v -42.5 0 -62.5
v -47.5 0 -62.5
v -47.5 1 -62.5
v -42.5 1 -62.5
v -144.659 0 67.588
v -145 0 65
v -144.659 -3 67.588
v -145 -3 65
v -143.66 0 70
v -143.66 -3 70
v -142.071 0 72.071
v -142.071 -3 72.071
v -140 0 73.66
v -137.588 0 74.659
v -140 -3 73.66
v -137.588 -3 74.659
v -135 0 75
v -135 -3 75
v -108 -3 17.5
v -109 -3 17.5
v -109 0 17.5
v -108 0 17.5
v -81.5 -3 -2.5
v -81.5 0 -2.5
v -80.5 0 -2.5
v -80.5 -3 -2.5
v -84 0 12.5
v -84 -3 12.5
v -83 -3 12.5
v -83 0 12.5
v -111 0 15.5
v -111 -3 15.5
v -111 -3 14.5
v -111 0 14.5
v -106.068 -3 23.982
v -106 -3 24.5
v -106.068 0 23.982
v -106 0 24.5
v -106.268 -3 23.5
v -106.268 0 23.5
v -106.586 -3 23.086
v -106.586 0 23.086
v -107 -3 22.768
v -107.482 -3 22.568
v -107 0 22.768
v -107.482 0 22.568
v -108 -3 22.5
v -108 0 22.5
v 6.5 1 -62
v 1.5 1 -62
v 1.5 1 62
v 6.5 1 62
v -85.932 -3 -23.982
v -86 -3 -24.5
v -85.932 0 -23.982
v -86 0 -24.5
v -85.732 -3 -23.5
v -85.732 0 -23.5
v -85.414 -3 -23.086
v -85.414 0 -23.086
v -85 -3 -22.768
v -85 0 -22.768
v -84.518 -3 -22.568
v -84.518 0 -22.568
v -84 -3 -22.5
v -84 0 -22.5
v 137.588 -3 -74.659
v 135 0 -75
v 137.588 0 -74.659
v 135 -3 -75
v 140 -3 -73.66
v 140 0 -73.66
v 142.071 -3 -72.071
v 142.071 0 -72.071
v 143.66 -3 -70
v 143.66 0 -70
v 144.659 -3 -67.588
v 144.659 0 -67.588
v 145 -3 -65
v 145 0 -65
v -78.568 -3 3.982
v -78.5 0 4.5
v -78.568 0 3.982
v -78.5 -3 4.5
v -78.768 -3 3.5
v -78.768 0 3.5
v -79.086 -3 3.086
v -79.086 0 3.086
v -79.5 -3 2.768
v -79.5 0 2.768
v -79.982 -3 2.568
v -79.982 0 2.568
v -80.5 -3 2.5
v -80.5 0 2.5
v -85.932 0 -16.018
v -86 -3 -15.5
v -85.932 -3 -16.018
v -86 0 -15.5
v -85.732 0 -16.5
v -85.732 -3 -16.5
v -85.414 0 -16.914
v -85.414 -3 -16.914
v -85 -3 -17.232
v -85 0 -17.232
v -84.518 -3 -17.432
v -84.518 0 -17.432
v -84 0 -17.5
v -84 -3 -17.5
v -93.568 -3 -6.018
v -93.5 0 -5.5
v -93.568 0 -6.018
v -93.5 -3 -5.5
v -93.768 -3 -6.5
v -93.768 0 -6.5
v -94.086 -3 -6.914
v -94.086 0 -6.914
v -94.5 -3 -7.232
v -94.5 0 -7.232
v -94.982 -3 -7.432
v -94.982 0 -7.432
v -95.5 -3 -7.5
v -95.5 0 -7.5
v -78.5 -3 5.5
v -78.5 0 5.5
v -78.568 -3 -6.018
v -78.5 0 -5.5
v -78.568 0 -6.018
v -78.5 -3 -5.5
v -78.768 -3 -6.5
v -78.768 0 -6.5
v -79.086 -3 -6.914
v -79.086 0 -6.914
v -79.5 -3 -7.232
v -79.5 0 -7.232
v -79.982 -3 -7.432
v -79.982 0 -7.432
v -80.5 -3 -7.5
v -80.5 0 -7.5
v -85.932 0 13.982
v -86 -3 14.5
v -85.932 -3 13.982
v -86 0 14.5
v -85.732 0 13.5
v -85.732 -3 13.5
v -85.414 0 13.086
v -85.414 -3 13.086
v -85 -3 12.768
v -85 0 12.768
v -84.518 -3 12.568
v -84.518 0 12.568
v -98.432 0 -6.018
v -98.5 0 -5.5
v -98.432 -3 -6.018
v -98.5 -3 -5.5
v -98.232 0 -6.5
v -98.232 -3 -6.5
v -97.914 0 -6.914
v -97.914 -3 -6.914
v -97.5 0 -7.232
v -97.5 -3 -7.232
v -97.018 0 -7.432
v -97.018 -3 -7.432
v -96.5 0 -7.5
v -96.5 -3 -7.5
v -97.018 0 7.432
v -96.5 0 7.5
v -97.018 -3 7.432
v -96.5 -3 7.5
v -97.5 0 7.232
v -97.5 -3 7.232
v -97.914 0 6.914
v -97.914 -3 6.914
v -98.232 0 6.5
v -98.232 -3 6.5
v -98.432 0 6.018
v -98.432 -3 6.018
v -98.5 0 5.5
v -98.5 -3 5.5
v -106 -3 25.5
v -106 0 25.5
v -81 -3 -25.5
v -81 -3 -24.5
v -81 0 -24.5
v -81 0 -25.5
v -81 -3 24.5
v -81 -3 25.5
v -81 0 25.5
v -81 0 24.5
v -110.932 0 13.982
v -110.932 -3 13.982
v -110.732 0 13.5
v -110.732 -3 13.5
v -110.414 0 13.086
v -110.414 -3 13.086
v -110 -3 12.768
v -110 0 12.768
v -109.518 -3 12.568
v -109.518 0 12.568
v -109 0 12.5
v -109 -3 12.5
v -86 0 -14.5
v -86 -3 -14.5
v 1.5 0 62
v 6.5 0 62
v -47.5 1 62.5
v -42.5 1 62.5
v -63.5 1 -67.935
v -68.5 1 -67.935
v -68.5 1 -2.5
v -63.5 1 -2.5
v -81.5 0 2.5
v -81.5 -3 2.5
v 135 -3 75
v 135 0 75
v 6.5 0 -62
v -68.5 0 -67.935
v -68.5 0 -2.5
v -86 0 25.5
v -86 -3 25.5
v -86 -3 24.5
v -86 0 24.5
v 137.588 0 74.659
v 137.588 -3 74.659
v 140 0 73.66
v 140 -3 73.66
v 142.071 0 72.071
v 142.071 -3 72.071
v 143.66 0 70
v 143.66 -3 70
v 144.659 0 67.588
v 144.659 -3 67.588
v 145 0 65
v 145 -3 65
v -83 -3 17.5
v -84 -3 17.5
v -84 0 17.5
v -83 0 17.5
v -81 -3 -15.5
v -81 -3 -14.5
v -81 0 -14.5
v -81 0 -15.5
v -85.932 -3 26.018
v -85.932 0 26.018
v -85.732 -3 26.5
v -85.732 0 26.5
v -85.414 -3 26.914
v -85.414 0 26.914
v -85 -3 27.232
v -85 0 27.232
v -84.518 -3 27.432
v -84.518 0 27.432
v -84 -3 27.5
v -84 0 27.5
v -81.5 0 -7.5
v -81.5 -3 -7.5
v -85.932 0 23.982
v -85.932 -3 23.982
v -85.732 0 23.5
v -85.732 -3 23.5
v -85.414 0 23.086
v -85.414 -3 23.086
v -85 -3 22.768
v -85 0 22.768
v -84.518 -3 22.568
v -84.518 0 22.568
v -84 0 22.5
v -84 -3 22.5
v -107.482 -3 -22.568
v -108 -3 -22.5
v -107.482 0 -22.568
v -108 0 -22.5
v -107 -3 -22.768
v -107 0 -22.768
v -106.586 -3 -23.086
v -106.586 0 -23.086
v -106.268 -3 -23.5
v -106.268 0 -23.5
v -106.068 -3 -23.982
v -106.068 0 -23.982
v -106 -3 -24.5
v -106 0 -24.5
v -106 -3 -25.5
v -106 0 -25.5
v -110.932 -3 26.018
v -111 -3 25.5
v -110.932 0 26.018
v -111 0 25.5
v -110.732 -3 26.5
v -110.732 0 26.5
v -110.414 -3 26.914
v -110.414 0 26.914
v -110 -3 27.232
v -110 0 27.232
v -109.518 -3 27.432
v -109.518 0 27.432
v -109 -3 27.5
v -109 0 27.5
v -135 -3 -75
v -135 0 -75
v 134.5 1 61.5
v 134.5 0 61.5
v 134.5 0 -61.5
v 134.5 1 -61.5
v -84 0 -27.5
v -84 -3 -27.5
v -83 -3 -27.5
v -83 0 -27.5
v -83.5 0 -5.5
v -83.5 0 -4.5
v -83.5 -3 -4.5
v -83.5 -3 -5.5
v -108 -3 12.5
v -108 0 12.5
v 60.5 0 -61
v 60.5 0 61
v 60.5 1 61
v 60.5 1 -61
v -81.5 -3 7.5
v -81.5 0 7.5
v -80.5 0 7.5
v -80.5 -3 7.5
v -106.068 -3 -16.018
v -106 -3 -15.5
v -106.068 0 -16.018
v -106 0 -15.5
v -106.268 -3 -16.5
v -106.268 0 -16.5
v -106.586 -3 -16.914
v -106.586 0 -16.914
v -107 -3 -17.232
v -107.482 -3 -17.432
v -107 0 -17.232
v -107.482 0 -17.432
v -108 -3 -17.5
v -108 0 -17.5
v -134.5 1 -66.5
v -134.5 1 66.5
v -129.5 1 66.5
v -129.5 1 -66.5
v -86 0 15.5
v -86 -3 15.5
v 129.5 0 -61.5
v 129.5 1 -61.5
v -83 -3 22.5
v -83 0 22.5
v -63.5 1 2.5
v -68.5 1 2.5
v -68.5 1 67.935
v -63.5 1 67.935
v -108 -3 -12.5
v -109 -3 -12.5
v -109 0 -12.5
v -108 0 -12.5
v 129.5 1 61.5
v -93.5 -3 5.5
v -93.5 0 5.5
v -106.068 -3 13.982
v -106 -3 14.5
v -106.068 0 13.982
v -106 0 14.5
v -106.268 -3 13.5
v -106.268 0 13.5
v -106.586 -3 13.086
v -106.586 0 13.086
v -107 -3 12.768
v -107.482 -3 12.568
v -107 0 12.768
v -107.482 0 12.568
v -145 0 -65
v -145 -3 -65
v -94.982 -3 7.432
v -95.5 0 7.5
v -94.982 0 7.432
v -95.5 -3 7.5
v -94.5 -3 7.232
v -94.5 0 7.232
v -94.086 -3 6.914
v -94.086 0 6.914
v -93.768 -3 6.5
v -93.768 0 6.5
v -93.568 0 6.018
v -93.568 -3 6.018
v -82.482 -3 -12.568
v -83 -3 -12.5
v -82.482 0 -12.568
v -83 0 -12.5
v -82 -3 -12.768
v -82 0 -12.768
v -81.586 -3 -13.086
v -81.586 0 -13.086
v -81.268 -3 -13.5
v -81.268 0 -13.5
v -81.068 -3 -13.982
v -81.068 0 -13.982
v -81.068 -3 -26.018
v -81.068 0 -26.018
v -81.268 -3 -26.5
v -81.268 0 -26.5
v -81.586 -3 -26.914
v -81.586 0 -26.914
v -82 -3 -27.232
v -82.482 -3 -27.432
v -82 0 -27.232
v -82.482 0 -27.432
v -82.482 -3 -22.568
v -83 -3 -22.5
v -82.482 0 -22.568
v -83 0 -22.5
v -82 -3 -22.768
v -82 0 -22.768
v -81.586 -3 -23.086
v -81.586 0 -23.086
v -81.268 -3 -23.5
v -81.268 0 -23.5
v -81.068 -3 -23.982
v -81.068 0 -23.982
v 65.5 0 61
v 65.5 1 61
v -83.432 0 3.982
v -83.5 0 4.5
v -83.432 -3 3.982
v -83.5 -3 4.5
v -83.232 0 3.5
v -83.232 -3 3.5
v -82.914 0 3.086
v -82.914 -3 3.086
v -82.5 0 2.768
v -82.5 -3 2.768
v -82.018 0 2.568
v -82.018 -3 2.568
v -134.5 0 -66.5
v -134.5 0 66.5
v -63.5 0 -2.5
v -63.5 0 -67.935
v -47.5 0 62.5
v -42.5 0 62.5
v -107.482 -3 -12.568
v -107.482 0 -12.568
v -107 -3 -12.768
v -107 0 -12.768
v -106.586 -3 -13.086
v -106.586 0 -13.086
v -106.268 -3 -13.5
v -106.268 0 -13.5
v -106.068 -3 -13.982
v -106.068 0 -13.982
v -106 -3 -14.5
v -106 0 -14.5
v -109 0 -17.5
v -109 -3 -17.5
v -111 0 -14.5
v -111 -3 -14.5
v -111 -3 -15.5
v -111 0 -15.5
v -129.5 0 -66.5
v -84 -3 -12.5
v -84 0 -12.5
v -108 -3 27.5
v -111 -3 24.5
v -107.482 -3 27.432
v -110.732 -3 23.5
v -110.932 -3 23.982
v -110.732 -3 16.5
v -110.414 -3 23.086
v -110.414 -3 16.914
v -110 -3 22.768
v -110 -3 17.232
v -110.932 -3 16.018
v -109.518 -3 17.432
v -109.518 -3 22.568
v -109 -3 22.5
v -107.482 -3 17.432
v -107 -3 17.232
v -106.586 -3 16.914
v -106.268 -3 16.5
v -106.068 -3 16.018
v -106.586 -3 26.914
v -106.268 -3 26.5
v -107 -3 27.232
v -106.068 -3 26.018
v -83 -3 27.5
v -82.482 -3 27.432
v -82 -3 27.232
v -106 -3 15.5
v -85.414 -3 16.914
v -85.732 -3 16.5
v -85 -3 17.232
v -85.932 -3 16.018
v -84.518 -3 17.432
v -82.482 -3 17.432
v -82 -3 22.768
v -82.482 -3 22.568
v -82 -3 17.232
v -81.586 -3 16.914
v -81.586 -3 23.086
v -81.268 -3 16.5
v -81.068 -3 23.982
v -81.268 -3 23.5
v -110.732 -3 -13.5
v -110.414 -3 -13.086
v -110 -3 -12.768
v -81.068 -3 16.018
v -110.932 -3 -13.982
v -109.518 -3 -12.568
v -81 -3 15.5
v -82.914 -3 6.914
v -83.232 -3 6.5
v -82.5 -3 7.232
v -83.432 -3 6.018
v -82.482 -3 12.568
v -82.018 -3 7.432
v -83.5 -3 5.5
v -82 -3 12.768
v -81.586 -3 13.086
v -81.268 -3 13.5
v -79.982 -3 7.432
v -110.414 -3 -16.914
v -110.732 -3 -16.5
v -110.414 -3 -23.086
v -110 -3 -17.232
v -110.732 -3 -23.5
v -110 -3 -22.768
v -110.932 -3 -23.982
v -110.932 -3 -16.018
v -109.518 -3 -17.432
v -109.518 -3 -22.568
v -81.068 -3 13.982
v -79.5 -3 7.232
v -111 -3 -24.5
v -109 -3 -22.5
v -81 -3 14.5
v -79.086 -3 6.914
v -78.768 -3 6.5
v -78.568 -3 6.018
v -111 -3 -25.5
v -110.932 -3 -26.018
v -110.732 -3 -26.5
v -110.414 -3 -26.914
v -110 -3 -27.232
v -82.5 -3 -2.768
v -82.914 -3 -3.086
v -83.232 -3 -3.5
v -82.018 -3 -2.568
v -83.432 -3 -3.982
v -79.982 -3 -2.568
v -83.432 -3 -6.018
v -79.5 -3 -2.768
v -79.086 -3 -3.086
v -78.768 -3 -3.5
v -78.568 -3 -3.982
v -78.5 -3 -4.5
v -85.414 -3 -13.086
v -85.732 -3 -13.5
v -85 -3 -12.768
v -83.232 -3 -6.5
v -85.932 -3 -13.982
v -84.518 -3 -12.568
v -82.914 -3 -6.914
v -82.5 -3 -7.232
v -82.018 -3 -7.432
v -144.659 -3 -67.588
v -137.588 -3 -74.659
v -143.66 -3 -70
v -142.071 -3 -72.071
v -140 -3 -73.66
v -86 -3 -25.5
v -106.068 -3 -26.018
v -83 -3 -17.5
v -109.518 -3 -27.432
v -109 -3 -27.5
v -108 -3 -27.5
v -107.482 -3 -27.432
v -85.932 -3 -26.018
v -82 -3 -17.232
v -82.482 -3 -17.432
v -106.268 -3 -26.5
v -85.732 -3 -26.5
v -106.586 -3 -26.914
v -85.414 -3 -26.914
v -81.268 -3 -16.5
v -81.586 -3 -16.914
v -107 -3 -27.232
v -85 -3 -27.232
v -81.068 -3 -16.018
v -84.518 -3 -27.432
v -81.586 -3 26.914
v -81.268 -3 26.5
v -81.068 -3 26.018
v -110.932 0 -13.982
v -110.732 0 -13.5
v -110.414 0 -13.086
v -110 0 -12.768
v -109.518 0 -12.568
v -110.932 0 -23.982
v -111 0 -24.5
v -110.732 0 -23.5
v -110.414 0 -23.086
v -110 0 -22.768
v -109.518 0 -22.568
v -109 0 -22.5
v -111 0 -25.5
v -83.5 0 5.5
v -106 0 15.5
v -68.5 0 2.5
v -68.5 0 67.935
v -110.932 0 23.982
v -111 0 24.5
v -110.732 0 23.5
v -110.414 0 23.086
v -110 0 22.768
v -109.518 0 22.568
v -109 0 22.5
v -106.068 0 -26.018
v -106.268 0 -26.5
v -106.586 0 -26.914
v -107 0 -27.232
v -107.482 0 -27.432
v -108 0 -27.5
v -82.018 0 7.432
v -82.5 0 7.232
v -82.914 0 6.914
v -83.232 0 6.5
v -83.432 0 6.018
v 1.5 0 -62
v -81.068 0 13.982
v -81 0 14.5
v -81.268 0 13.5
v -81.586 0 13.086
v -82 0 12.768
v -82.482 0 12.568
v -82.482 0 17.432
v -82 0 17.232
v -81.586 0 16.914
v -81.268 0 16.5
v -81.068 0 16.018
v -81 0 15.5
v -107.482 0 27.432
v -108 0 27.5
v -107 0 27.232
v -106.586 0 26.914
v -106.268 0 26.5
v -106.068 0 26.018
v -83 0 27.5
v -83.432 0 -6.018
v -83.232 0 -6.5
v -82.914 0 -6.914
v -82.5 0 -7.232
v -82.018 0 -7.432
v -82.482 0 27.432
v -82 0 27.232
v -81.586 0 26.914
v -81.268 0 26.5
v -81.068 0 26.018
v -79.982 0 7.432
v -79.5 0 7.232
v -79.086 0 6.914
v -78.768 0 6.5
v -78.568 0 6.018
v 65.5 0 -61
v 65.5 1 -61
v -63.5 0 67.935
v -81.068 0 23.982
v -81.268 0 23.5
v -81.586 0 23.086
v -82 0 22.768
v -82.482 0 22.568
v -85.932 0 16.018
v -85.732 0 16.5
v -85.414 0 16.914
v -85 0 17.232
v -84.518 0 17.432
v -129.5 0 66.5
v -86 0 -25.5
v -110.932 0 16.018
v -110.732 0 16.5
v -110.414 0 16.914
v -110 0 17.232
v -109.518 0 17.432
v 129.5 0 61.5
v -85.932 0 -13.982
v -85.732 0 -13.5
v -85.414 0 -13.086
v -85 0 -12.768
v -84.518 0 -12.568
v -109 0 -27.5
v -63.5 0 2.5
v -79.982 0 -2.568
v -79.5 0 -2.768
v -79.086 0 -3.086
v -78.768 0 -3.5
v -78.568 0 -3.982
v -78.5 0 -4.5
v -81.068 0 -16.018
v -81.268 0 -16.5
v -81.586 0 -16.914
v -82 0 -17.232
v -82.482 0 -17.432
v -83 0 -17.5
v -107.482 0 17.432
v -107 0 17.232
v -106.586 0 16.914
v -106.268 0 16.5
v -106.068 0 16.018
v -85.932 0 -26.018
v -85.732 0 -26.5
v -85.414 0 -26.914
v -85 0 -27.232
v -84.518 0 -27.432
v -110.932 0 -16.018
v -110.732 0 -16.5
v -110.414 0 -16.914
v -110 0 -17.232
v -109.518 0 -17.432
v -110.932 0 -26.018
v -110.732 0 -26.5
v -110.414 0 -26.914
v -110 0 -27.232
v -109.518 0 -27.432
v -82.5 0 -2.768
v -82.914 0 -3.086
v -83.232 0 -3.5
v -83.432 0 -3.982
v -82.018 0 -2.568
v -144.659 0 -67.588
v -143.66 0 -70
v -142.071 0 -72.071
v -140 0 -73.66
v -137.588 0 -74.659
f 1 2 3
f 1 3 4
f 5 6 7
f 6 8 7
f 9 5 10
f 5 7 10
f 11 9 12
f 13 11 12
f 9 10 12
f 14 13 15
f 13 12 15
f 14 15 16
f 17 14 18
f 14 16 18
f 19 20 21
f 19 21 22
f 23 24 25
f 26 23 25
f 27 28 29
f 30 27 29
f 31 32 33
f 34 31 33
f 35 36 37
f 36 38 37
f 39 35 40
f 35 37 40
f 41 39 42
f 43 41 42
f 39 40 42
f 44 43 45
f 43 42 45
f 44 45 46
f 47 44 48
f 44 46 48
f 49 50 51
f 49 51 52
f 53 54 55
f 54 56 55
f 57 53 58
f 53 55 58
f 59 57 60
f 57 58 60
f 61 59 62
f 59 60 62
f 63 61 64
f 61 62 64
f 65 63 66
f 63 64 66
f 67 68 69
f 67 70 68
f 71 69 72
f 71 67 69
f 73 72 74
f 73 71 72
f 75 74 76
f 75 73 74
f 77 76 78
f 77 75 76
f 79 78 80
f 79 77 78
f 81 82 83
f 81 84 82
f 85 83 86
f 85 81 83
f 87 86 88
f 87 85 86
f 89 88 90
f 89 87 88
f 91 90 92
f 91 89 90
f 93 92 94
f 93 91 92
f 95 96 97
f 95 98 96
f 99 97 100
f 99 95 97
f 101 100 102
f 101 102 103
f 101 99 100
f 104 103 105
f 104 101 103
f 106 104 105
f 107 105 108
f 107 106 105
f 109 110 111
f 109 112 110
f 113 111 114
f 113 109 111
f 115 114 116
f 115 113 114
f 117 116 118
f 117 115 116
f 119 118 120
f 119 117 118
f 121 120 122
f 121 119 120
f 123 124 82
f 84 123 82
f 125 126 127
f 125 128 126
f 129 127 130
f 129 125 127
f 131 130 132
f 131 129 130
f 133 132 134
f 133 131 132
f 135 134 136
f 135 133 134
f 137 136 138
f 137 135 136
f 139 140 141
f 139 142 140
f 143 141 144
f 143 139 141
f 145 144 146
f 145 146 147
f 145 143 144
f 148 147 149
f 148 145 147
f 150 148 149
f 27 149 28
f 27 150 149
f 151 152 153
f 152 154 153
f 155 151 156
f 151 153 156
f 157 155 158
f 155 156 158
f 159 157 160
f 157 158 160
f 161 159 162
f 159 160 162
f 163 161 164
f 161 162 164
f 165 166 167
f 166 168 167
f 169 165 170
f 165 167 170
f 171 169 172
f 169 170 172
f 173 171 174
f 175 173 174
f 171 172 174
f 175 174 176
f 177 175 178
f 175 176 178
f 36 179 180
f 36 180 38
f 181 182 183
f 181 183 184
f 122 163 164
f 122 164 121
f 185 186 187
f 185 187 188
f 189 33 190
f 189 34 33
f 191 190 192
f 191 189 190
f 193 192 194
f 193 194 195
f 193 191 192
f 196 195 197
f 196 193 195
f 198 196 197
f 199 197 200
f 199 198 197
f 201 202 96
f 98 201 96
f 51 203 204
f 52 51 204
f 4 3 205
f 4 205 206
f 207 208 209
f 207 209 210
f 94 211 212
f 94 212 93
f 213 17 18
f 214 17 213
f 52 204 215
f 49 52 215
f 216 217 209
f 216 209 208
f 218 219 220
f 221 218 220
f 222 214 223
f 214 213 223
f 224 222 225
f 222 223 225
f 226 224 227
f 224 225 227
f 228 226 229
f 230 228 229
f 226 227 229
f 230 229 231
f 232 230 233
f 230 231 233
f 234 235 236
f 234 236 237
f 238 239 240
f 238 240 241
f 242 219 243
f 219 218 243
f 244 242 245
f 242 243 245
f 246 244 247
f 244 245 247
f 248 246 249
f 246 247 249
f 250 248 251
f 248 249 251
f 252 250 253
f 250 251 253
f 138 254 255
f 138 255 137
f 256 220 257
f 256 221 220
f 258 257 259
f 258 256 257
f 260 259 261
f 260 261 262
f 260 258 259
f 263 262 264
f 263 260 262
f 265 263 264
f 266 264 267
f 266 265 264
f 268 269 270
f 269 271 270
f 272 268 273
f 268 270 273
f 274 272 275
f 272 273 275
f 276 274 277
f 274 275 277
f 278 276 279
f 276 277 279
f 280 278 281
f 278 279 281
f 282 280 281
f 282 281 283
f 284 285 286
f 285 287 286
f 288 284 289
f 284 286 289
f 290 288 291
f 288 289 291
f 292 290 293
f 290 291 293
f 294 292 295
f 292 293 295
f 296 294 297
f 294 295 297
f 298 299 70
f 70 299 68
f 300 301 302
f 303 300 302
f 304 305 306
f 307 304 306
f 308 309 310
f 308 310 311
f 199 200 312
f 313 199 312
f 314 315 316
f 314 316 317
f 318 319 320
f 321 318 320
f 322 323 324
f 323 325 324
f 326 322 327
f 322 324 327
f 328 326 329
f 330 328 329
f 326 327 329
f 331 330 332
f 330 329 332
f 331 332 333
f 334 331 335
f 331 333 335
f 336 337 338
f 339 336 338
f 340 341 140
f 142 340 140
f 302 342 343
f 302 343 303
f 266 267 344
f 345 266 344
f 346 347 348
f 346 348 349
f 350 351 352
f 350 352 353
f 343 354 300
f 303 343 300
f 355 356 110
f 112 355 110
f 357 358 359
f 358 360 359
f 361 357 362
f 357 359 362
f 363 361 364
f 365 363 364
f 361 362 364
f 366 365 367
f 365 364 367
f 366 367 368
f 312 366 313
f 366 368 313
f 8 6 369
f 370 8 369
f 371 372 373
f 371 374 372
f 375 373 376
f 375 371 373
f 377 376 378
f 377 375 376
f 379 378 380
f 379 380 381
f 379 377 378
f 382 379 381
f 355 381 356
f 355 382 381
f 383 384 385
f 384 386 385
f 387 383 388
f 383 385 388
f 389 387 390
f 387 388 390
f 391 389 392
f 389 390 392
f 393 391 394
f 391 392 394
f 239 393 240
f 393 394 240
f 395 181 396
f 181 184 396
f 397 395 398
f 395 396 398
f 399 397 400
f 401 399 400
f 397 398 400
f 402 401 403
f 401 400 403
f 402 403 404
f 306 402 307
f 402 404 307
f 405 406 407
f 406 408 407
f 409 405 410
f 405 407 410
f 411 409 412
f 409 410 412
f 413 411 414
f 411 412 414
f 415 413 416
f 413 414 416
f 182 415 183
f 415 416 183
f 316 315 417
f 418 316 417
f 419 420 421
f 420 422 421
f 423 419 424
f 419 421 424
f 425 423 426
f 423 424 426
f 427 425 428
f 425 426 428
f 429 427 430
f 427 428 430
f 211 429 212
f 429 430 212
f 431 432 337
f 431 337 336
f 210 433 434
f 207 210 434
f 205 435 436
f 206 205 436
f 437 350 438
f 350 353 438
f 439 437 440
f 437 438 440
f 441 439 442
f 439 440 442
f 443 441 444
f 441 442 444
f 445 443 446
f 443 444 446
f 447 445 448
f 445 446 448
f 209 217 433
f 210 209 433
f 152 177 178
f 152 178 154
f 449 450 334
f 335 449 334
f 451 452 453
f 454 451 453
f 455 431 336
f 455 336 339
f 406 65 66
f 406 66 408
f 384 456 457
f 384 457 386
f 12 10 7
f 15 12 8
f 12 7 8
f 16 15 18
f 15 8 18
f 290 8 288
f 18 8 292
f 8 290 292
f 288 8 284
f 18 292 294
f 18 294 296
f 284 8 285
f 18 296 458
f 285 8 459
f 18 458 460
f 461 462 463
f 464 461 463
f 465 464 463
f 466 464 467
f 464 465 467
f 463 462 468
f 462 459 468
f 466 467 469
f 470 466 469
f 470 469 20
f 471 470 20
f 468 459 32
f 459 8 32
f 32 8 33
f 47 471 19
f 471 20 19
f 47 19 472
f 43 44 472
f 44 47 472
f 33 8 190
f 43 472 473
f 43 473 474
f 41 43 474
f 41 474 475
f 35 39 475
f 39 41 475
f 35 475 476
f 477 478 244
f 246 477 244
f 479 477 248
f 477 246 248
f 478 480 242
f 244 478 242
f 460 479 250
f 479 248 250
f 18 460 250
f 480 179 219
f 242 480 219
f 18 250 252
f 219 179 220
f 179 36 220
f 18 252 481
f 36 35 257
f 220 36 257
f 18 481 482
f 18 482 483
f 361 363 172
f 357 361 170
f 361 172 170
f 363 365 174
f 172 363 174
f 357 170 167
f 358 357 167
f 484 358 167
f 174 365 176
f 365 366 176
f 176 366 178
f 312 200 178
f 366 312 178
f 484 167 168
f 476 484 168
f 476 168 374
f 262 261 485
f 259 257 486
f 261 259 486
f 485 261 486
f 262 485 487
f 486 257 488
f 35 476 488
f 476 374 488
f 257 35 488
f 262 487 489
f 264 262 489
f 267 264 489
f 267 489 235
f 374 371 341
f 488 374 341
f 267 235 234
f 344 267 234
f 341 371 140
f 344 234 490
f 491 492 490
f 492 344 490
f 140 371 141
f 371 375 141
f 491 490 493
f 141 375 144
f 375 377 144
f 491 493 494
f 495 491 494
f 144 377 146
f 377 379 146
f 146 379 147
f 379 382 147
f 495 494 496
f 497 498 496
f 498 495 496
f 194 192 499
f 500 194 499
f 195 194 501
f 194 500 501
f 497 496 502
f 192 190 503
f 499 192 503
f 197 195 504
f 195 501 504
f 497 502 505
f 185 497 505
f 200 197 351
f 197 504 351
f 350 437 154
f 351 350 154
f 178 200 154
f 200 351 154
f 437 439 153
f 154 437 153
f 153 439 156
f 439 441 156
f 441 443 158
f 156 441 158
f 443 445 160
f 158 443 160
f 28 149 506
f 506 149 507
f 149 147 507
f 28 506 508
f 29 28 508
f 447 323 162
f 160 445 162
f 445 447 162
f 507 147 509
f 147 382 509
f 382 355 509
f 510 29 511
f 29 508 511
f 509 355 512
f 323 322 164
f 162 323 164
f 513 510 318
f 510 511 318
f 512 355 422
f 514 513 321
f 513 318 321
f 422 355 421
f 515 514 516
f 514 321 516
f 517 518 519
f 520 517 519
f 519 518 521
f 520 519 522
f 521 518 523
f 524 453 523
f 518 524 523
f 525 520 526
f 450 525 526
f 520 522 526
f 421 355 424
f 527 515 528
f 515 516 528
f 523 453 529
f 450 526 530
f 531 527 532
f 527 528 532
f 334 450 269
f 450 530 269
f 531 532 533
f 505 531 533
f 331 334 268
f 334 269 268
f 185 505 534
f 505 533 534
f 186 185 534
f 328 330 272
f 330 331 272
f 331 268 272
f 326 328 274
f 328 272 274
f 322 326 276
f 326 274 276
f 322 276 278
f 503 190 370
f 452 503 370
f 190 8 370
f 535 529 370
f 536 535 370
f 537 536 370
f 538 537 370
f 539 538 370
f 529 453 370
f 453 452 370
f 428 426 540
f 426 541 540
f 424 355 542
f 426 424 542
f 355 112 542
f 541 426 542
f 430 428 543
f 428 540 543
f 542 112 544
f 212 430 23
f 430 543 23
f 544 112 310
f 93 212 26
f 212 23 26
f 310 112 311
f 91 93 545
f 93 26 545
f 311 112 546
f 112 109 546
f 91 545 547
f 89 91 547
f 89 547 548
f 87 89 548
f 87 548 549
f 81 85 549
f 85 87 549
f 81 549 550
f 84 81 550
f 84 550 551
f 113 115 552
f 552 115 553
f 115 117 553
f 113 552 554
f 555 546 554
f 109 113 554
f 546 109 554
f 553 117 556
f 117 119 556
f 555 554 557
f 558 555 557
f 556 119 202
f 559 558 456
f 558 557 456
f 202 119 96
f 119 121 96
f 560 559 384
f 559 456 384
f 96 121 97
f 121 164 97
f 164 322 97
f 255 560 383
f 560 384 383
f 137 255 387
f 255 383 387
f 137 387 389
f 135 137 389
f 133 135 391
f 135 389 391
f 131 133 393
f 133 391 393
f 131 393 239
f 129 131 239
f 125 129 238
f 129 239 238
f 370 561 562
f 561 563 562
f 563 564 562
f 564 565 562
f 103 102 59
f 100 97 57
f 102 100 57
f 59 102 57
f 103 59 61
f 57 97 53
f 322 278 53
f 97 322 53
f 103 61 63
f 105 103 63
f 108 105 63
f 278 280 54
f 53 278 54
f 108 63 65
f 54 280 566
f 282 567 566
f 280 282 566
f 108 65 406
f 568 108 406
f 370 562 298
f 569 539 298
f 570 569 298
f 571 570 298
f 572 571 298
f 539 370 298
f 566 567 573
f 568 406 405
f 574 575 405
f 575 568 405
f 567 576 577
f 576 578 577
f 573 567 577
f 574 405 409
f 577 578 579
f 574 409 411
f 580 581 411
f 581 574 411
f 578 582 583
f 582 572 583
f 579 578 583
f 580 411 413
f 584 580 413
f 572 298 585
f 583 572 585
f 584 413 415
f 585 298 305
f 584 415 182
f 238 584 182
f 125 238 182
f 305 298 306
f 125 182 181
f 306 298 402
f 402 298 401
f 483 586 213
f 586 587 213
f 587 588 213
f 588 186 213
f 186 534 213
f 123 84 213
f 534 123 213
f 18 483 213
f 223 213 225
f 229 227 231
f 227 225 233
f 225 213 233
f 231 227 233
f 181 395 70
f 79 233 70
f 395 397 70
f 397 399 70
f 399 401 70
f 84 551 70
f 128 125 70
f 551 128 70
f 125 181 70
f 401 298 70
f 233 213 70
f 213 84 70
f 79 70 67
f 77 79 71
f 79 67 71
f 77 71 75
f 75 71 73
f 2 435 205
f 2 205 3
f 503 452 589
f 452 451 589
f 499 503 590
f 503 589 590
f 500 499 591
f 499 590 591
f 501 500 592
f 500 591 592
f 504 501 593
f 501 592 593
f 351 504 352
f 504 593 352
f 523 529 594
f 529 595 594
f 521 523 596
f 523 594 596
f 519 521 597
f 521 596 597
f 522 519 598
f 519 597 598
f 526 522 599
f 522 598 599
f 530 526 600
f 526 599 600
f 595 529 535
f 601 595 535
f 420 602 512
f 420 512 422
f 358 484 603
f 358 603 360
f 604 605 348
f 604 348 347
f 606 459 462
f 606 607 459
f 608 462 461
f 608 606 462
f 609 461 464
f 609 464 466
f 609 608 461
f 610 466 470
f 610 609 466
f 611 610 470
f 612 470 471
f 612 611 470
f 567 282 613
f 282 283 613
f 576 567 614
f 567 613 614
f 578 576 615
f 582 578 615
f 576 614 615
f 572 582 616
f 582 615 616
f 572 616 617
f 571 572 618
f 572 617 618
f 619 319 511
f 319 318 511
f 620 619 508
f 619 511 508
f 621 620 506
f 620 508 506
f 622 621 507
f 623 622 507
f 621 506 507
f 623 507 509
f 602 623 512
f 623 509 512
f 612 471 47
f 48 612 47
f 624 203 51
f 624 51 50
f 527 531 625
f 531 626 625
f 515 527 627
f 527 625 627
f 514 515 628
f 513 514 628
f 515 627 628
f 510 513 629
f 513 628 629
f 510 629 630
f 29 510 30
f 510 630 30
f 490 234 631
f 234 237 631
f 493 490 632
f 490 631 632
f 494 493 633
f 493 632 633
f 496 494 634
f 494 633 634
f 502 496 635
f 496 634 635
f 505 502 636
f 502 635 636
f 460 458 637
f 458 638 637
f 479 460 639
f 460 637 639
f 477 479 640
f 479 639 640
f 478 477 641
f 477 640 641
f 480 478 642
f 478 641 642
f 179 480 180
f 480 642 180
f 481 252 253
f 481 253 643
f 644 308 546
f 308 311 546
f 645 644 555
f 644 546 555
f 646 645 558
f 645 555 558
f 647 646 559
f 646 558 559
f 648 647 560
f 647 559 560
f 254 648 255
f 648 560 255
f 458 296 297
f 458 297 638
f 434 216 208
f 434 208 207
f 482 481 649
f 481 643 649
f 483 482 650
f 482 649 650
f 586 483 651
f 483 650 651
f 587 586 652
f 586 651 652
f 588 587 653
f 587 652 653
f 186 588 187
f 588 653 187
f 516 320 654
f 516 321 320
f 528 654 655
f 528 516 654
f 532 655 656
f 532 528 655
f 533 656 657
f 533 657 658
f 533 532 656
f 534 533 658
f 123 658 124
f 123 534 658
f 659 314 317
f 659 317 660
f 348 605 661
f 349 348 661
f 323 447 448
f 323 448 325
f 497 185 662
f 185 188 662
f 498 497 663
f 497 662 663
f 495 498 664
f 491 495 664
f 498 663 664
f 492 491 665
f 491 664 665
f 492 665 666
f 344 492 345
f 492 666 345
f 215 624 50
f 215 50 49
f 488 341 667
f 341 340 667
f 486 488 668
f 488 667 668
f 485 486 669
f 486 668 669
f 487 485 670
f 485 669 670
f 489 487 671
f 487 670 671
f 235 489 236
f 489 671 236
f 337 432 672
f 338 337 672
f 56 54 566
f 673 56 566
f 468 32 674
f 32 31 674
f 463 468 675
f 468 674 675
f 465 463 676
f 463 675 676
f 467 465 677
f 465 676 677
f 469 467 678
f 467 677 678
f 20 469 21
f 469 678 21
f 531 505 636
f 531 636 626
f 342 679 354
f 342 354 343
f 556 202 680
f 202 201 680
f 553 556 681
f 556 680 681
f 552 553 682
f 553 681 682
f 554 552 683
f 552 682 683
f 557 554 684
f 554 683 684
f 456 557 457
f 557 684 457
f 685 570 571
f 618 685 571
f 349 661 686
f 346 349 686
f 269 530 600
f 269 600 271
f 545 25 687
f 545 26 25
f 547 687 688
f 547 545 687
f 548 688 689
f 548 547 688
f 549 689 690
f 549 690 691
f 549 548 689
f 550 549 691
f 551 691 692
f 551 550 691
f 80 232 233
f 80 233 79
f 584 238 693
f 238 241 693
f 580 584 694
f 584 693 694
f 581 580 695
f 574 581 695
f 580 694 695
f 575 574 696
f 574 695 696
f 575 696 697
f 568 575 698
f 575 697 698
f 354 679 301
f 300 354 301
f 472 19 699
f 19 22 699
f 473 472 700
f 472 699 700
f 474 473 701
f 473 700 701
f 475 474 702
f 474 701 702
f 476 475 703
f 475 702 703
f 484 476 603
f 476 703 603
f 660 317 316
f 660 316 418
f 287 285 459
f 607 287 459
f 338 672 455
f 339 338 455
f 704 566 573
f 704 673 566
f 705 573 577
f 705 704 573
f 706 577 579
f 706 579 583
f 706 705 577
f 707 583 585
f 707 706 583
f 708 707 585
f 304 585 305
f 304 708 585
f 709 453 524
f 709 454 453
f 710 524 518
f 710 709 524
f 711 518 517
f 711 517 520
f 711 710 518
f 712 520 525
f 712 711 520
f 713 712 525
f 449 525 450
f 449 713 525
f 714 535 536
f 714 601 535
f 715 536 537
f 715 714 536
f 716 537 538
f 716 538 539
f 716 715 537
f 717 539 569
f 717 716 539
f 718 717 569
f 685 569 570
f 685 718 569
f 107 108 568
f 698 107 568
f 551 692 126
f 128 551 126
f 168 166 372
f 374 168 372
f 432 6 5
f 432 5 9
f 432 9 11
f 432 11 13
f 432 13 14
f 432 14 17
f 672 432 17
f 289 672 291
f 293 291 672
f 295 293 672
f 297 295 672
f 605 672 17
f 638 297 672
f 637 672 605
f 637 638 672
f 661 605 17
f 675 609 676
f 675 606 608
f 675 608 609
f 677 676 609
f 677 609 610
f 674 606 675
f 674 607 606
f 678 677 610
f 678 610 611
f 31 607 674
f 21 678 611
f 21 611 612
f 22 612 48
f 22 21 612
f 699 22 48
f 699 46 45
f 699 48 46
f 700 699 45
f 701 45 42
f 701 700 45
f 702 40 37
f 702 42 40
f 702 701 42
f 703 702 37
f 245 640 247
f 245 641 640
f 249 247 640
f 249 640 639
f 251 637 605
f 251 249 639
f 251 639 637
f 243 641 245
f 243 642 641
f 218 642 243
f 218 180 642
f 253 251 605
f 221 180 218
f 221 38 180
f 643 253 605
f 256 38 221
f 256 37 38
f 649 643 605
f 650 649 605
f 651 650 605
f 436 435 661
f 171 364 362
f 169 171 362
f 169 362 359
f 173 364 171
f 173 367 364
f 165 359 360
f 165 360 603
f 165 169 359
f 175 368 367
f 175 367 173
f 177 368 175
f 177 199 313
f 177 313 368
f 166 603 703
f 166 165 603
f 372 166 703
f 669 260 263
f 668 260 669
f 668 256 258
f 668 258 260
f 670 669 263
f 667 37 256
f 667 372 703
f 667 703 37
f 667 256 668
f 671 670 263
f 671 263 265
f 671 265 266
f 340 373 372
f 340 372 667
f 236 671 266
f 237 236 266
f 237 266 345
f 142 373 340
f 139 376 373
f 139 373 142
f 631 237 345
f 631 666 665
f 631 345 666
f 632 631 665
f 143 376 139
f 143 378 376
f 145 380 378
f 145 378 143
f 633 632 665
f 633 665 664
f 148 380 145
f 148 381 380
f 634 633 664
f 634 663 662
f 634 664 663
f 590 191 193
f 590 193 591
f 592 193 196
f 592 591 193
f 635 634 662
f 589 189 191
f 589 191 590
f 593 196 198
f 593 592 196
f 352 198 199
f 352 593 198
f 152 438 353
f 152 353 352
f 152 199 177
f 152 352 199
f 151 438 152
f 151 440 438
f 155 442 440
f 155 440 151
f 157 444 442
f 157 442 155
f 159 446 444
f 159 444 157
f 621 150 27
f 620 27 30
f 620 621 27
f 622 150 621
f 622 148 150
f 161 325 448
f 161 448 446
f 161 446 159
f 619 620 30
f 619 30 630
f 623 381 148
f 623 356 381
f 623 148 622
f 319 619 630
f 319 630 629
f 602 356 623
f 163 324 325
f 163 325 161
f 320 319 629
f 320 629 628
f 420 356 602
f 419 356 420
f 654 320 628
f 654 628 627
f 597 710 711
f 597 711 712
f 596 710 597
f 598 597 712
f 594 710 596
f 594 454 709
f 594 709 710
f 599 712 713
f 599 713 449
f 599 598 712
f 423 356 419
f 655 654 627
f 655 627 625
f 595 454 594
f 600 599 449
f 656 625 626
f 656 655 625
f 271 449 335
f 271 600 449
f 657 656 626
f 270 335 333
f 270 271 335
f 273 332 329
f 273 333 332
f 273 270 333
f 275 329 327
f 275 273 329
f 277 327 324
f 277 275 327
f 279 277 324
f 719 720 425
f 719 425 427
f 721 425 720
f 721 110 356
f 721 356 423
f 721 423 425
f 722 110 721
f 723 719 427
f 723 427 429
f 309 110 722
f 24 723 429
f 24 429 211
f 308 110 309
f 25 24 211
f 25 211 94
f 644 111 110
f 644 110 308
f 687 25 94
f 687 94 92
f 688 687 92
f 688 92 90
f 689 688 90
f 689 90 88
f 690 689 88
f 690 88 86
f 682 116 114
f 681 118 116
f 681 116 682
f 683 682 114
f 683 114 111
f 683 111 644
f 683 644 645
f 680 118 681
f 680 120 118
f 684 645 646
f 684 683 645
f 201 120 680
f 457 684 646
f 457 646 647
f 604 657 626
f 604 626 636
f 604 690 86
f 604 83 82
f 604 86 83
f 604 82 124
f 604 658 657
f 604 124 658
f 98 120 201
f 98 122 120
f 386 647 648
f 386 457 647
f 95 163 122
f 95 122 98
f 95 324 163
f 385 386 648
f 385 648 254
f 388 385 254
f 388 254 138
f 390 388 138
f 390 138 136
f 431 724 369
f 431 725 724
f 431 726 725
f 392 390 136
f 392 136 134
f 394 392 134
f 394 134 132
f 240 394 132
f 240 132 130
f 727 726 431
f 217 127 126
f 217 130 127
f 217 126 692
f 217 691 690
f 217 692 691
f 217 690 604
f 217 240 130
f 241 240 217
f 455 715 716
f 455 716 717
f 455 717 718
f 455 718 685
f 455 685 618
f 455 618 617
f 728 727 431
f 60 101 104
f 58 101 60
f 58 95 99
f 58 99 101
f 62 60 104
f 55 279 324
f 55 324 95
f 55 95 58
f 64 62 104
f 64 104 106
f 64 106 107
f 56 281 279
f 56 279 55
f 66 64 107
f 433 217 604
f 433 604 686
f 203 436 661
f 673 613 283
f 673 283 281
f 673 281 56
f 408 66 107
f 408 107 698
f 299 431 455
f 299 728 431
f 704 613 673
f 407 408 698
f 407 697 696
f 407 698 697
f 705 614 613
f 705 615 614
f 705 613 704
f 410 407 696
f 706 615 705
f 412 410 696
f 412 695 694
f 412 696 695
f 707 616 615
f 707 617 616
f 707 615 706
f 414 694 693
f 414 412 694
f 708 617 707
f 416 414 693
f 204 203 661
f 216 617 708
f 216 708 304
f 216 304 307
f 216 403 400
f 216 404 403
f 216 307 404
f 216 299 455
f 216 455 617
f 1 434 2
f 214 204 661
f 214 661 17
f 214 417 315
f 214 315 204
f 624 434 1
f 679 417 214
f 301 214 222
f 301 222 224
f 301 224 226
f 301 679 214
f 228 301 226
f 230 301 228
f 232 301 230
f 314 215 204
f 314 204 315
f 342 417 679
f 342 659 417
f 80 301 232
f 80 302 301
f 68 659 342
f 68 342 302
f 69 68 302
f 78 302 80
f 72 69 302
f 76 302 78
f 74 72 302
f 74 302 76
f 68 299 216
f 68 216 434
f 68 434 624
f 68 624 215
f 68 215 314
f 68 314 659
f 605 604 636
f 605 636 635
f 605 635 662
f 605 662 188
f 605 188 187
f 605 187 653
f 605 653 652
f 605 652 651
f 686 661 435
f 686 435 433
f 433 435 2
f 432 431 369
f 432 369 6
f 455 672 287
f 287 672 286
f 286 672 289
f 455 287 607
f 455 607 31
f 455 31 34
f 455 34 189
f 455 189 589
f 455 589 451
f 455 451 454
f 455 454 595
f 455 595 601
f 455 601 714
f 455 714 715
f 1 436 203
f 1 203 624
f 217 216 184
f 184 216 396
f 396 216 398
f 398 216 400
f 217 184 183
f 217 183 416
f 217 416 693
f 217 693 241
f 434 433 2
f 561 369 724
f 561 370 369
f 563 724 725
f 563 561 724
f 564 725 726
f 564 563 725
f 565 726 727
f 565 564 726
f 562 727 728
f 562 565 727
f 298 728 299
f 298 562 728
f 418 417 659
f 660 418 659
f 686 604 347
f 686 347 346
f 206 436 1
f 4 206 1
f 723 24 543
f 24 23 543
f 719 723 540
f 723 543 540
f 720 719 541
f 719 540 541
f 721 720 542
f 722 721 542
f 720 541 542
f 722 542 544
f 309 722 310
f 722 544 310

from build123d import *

# Parameters (mm, degrees)
SKETCH2_W                = 5
SKETCH2_H                = 133
ELEMENTGEOMETRY_DEPTH    = 1
SKETCH2_H_2              = 65.435
ELEMENTGEOMETRY_2_DEPTH  = 1
ELEMENTGEOMETRY_3_DEPTH  = 1
SKETCH2_H_3              = 125
ELEMENTGEOMETRY_4_DEPTH  = 1
SKETCH2_H_4              = 124
ELEMENTGEOMETRY_5_DEPTH  = 1
SKETCH2_H_5              = 123
ELEMENTGEOMETRY_6_DEPTH  = 1
SKETCH2_H_6              = 122
ELEMENTGEOMETRY_7_DEPTH  = 1
SKETCH5_W                = 290
SKETCH5_H                = 150
BOARDGEOMETRY_DEPTH      = 3
CABLECUTOUT_REACH        = 165.276
SKETCH7_W                = 5
SKETCH7_H                = 5
SKETCH7_H_2              = 15
MOUNTINGHOLES_DEPTH      = 164.275840221
MOUNTINGHOLES_DEPTH_BACK = 164.275840221
SKETCH8_W                = 5
SKETCH8_H                = 5
BOARDFILLET_R            = 10
MOUNTINGHOLEFILLET_R     = 2


with BuildPart() as part:
    # Sketch2 → ElementGeometry (new body)
    with BuildSketch(Plane(origin=(0, 0, 0), x_dir=(1, 0, 0), z_dir=(0, 1, 0))):
        with Locations((-132, 0)):
            Rectangle(SKETCH2_W, SKETCH2_H)
    extrude(amount=ELEMENTGEOMETRY_DEPTH)



with BuildPart() as body_2:
    # Sketch2 → ElementGeometry 2 (new body)
    with BuildSketch(Plane(origin=(0, 0, 0), x_dir=(1, 0, 0), z_dir=(0, 1, 0))):
        with Locations((-66, 35.2175)):
            Rectangle(SKETCH2_W, SKETCH2_H_2)
    extrude(amount=ELEMENTGEOMETRY_2_DEPTH)


with BuildPart() as body_3:
    # Sketch2 → ElementGeometry 3 (new body)
    with BuildSketch(Plane(origin=(0, 0, 0), x_dir=(1, 0, 0), z_dir=(0, 1, 0))):
        with Locations((-66, -35.2175)):
            Rectangle(SKETCH2_W, SKETCH2_H_2)
    extrude(amount=ELEMENTGEOMETRY_3_DEPTH)


with BuildPart() as body_4:
    # Sketch2 → ElementGeometry 4 (new body)
    with BuildSketch(Plane(origin=(0, 0, 0), x_dir=(1, 0, 0), z_dir=(0, 1, 0))):
        with Locations((-45, 0)):
            Rectangle(SKETCH2_W, SKETCH2_H_3)
    extrude(amount=ELEMENTGEOMETRY_4_DEPTH)


with BuildPart() as body_5:
    # Sketch2 → ElementGeometry 5 (new body)
    with BuildSketch(Plane(origin=(0, 0, 0), x_dir=(1, 0, 0), z_dir=(0, 1, 0))):
        with Locations((4, 0)):
            Rectangle(SKETCH2_W, SKETCH2_H_4)
    extrude(amount=ELEMENTGEOMETRY_5_DEPTH)


with BuildPart() as body_6:
    # Sketch2 → ElementGeometry 6 (new body)
    with BuildSketch(Plane(origin=(0, 0, 0), x_dir=(1, 0, 0), z_dir=(0, 1, 0))):
        with Locations((132, 0)):
            Rectangle(SKETCH2_W, SKETCH2_H_5)
    extrude(amount=ELEMENTGEOMETRY_6_DEPTH)


with BuildPart() as body_7:
    # Sketch2 → ElementGeometry 7 (new body)
    with BuildSketch(Plane(origin=(0, 0, 0), x_dir=(1, 0, 0), z_dir=(0, 1, 0))):
        with Locations((63, 0)):
            Rectangle(SKETCH2_W, SKETCH2_H_6)
    extrude(amount=ELEMENTGEOMETRY_7_DEPTH)


with BuildPart() as part_1:
    add(part.part)

    add(body_2.part)  # BoardGeometry merges body 2

    add(body_3.part)  # BoardGeometry merges body 3

    add(body_4.part)  # BoardGeometry merges body 4

    add(body_5.part)  # BoardGeometry merges body 5

    add(body_6.part)  # BoardGeometry merges body 6

    add(body_7.part)  # BoardGeometry merges body 7
    # Sketch5 → BoardGeometry (add)
    with BuildSketch(Plane(origin=(0, 0, 0), x_dir=(1, 0, 0), z_dir=(0, 1, 0))):
        Rectangle(SKETCH5_W, SKETCH5_H)
    extrude(amount=-BOARDGEOMETRY_DEPTH)

    # Sketch7 → CableCutout (cut, up to next)
    with BuildSketch(Plane(origin=(0, 0, 0), x_dir=(1, 0, 0), z_dir=(0, 1, 0)), mode=Mode.PRIVATE) as cablecutout_sk1:
        with Locations((-81, -5)):
            Rectangle(SKETCH7_W, SKETCH7_H)
    cablecutout_tool1 = extrude(cablecutout_sk1.sketch, amount=-CABLECUTOUT_REACH, mode=Mode.PRIVATE) & part_1.part
    # Sketch7 → CableCutout (cut, up to next)
    with BuildSketch(Plane(origin=(0, 0, 0), x_dir=(1, 0, 0), z_dir=(0, 1, 0)), mode=Mode.PRIVATE) as cablecutout_sk2:
        with Locations((-81, 5)):
            Rectangle(SKETCH7_W, SKETCH7_H)
    cablecutout_tool2 = extrude(cablecutout_sk2.sketch, amount=-CABLECUTOUT_REACH, mode=Mode.PRIVATE) & part_1.part
    # Sketch7 → CableCutout (cut, up to next)
    with BuildSketch(Plane(origin=(0, 0, 0), x_dir=(1, 0, 0), z_dir=(0, 1, 0)), mode=Mode.PRIVATE) as cablecutout_sk3:
        with Locations((-96, 0)):
            Rectangle(SKETCH7_W, SKETCH7_H_2)
    cablecutout_tool3 = extrude(cablecutout_sk3.sketch, amount=-CABLECUTOUT_REACH, mode=Mode.PRIVATE) & part_1.part
    add(cablecutout_tool1.solids().sort_by_distance((-81, 0, 5))[0], mode=Mode.SUBTRACT)
    add(cablecutout_tool2.solids().sort_by_distance((-81, 0, -5))[0], mode=Mode.SUBTRACT)
    add(cablecutout_tool3.solids().sort_by_distance((-96, 0, 0))[0], mode=Mode.SUBTRACT)

    # Sketch8 → MountingHoles (cut, two sides: drawn at the far end of the back side and taken through both)
    with BuildSketch(Plane(origin=(0, 0, 0), x_dir=(1, 0, 0), z_dir=(0, 1, 0)).offset(-MOUNTINGHOLES_DEPTH_BACK)):
        with Locations((-108.5, 15)):
            Rectangle(SKETCH8_W, SKETCH8_H)
        with Locations((-83.5, 15)):
            Rectangle(SKETCH8_W, SKETCH8_H)
        with Locations((-83.5, -15)):
            Rectangle(SKETCH8_W, SKETCH8_H)
        with Locations((-108.5, -15)):
            Rectangle(SKETCH8_W, SKETCH8_H)
        with Locations((-83.5, -25)):
            Rectangle(SKETCH8_W, SKETCH8_H)
        with Locations((-108.5, -25)):
            Rectangle(SKETCH8_W, SKETCH8_H)
        with Locations((-83.5, 25)):
            Rectangle(SKETCH8_W, SKETCH8_H)
        with Locations((-108.5, 25)):
            Rectangle(SKETCH8_W, SKETCH8_H)
    extrude(amount=MOUNTINGHOLES_DEPTH + MOUNTINGHOLES_DEPTH_BACK, mode=Mode.SUBTRACT)

    # BoardFillet
    boardfillet_edges = [part_1.edges().sort_by_distance(p)[0] for p in [
        (-145, -1.5, -75),
        (145, -1.5, -75),
        (145, -1.5, 75),
        (-145, -1.5, 75),
    ]]
    fillet(boardfillet_edges, radius=BOARDFILLET_R)

    # MountingHoleFillet
    mountingholefillet_edges = [part_1.edges().sort_by_distance(p)[0] for p in [
        (-78.5, -1.5, -2.5),
        (-83.5, -1.5, -2.5),
        (-83.5, -1.5, -7.5),
        (-78.5, -1.5, -7.5),
        (-78.5, -1.5, 2.5),
        (-78.5, -1.5, 7.5),
        (-83.5, -1.5, 7.5),
        (-83.5, -1.5, 2.5),
        (-111, -1.5, 12.5),
        (-106, -1.5, 12.5),
        (-106, -1.5, 17.5),
        (-111, -1.5, 17.5),
        (-86, -1.5, 12.5),
        (-81, -1.5, 12.5),
        (-81, -1.5, 17.5),
        (-86, -1.5, 17.5),
        (-106, -1.5, 22.5),
        (-106, -1.5, 27.5),
        (-111, -1.5, 27.5),
        (-111, -1.5, 22.5),
        (-86, -1.5, -17.5),
        (-81, -1.5, -17.5),
        (-81, -1.5, -12.5),
        (-86, -1.5, -12.5),
        (-81, -1.5, 22.5),
        (-81, -1.5, 27.5),
        (-86, -1.5, 27.5),
        (-86, -1.5, 22.5),
        (-81, -1.5, -27.5),
        (-81, -1.5, -22.5),
        (-86, -1.5, -22.5),
        (-86, -1.5, -27.5),
        (-106, -1.5, -22.5),
        (-111, -1.5, -22.5),
        (-111, -1.5, -27.5),
        (-106, -1.5, -27.5),
        (-106, -1.5, -17.5),
        (-106, -1.5, -12.5),
        (-111, -1.5, -12.5),
        (-111, -1.5, -17.5),
        (-93.5, -1.5, -7.5),
        (-93.5, -1.5, 7.5),
        (-98.5, -1.5, 7.5),
        (-98.5, -1.5, -7.5),
    ]]
    fillet(mountingholefillet_edges, radius=MOUNTINGHOLEFILLET_R)


solid = part_1.part
